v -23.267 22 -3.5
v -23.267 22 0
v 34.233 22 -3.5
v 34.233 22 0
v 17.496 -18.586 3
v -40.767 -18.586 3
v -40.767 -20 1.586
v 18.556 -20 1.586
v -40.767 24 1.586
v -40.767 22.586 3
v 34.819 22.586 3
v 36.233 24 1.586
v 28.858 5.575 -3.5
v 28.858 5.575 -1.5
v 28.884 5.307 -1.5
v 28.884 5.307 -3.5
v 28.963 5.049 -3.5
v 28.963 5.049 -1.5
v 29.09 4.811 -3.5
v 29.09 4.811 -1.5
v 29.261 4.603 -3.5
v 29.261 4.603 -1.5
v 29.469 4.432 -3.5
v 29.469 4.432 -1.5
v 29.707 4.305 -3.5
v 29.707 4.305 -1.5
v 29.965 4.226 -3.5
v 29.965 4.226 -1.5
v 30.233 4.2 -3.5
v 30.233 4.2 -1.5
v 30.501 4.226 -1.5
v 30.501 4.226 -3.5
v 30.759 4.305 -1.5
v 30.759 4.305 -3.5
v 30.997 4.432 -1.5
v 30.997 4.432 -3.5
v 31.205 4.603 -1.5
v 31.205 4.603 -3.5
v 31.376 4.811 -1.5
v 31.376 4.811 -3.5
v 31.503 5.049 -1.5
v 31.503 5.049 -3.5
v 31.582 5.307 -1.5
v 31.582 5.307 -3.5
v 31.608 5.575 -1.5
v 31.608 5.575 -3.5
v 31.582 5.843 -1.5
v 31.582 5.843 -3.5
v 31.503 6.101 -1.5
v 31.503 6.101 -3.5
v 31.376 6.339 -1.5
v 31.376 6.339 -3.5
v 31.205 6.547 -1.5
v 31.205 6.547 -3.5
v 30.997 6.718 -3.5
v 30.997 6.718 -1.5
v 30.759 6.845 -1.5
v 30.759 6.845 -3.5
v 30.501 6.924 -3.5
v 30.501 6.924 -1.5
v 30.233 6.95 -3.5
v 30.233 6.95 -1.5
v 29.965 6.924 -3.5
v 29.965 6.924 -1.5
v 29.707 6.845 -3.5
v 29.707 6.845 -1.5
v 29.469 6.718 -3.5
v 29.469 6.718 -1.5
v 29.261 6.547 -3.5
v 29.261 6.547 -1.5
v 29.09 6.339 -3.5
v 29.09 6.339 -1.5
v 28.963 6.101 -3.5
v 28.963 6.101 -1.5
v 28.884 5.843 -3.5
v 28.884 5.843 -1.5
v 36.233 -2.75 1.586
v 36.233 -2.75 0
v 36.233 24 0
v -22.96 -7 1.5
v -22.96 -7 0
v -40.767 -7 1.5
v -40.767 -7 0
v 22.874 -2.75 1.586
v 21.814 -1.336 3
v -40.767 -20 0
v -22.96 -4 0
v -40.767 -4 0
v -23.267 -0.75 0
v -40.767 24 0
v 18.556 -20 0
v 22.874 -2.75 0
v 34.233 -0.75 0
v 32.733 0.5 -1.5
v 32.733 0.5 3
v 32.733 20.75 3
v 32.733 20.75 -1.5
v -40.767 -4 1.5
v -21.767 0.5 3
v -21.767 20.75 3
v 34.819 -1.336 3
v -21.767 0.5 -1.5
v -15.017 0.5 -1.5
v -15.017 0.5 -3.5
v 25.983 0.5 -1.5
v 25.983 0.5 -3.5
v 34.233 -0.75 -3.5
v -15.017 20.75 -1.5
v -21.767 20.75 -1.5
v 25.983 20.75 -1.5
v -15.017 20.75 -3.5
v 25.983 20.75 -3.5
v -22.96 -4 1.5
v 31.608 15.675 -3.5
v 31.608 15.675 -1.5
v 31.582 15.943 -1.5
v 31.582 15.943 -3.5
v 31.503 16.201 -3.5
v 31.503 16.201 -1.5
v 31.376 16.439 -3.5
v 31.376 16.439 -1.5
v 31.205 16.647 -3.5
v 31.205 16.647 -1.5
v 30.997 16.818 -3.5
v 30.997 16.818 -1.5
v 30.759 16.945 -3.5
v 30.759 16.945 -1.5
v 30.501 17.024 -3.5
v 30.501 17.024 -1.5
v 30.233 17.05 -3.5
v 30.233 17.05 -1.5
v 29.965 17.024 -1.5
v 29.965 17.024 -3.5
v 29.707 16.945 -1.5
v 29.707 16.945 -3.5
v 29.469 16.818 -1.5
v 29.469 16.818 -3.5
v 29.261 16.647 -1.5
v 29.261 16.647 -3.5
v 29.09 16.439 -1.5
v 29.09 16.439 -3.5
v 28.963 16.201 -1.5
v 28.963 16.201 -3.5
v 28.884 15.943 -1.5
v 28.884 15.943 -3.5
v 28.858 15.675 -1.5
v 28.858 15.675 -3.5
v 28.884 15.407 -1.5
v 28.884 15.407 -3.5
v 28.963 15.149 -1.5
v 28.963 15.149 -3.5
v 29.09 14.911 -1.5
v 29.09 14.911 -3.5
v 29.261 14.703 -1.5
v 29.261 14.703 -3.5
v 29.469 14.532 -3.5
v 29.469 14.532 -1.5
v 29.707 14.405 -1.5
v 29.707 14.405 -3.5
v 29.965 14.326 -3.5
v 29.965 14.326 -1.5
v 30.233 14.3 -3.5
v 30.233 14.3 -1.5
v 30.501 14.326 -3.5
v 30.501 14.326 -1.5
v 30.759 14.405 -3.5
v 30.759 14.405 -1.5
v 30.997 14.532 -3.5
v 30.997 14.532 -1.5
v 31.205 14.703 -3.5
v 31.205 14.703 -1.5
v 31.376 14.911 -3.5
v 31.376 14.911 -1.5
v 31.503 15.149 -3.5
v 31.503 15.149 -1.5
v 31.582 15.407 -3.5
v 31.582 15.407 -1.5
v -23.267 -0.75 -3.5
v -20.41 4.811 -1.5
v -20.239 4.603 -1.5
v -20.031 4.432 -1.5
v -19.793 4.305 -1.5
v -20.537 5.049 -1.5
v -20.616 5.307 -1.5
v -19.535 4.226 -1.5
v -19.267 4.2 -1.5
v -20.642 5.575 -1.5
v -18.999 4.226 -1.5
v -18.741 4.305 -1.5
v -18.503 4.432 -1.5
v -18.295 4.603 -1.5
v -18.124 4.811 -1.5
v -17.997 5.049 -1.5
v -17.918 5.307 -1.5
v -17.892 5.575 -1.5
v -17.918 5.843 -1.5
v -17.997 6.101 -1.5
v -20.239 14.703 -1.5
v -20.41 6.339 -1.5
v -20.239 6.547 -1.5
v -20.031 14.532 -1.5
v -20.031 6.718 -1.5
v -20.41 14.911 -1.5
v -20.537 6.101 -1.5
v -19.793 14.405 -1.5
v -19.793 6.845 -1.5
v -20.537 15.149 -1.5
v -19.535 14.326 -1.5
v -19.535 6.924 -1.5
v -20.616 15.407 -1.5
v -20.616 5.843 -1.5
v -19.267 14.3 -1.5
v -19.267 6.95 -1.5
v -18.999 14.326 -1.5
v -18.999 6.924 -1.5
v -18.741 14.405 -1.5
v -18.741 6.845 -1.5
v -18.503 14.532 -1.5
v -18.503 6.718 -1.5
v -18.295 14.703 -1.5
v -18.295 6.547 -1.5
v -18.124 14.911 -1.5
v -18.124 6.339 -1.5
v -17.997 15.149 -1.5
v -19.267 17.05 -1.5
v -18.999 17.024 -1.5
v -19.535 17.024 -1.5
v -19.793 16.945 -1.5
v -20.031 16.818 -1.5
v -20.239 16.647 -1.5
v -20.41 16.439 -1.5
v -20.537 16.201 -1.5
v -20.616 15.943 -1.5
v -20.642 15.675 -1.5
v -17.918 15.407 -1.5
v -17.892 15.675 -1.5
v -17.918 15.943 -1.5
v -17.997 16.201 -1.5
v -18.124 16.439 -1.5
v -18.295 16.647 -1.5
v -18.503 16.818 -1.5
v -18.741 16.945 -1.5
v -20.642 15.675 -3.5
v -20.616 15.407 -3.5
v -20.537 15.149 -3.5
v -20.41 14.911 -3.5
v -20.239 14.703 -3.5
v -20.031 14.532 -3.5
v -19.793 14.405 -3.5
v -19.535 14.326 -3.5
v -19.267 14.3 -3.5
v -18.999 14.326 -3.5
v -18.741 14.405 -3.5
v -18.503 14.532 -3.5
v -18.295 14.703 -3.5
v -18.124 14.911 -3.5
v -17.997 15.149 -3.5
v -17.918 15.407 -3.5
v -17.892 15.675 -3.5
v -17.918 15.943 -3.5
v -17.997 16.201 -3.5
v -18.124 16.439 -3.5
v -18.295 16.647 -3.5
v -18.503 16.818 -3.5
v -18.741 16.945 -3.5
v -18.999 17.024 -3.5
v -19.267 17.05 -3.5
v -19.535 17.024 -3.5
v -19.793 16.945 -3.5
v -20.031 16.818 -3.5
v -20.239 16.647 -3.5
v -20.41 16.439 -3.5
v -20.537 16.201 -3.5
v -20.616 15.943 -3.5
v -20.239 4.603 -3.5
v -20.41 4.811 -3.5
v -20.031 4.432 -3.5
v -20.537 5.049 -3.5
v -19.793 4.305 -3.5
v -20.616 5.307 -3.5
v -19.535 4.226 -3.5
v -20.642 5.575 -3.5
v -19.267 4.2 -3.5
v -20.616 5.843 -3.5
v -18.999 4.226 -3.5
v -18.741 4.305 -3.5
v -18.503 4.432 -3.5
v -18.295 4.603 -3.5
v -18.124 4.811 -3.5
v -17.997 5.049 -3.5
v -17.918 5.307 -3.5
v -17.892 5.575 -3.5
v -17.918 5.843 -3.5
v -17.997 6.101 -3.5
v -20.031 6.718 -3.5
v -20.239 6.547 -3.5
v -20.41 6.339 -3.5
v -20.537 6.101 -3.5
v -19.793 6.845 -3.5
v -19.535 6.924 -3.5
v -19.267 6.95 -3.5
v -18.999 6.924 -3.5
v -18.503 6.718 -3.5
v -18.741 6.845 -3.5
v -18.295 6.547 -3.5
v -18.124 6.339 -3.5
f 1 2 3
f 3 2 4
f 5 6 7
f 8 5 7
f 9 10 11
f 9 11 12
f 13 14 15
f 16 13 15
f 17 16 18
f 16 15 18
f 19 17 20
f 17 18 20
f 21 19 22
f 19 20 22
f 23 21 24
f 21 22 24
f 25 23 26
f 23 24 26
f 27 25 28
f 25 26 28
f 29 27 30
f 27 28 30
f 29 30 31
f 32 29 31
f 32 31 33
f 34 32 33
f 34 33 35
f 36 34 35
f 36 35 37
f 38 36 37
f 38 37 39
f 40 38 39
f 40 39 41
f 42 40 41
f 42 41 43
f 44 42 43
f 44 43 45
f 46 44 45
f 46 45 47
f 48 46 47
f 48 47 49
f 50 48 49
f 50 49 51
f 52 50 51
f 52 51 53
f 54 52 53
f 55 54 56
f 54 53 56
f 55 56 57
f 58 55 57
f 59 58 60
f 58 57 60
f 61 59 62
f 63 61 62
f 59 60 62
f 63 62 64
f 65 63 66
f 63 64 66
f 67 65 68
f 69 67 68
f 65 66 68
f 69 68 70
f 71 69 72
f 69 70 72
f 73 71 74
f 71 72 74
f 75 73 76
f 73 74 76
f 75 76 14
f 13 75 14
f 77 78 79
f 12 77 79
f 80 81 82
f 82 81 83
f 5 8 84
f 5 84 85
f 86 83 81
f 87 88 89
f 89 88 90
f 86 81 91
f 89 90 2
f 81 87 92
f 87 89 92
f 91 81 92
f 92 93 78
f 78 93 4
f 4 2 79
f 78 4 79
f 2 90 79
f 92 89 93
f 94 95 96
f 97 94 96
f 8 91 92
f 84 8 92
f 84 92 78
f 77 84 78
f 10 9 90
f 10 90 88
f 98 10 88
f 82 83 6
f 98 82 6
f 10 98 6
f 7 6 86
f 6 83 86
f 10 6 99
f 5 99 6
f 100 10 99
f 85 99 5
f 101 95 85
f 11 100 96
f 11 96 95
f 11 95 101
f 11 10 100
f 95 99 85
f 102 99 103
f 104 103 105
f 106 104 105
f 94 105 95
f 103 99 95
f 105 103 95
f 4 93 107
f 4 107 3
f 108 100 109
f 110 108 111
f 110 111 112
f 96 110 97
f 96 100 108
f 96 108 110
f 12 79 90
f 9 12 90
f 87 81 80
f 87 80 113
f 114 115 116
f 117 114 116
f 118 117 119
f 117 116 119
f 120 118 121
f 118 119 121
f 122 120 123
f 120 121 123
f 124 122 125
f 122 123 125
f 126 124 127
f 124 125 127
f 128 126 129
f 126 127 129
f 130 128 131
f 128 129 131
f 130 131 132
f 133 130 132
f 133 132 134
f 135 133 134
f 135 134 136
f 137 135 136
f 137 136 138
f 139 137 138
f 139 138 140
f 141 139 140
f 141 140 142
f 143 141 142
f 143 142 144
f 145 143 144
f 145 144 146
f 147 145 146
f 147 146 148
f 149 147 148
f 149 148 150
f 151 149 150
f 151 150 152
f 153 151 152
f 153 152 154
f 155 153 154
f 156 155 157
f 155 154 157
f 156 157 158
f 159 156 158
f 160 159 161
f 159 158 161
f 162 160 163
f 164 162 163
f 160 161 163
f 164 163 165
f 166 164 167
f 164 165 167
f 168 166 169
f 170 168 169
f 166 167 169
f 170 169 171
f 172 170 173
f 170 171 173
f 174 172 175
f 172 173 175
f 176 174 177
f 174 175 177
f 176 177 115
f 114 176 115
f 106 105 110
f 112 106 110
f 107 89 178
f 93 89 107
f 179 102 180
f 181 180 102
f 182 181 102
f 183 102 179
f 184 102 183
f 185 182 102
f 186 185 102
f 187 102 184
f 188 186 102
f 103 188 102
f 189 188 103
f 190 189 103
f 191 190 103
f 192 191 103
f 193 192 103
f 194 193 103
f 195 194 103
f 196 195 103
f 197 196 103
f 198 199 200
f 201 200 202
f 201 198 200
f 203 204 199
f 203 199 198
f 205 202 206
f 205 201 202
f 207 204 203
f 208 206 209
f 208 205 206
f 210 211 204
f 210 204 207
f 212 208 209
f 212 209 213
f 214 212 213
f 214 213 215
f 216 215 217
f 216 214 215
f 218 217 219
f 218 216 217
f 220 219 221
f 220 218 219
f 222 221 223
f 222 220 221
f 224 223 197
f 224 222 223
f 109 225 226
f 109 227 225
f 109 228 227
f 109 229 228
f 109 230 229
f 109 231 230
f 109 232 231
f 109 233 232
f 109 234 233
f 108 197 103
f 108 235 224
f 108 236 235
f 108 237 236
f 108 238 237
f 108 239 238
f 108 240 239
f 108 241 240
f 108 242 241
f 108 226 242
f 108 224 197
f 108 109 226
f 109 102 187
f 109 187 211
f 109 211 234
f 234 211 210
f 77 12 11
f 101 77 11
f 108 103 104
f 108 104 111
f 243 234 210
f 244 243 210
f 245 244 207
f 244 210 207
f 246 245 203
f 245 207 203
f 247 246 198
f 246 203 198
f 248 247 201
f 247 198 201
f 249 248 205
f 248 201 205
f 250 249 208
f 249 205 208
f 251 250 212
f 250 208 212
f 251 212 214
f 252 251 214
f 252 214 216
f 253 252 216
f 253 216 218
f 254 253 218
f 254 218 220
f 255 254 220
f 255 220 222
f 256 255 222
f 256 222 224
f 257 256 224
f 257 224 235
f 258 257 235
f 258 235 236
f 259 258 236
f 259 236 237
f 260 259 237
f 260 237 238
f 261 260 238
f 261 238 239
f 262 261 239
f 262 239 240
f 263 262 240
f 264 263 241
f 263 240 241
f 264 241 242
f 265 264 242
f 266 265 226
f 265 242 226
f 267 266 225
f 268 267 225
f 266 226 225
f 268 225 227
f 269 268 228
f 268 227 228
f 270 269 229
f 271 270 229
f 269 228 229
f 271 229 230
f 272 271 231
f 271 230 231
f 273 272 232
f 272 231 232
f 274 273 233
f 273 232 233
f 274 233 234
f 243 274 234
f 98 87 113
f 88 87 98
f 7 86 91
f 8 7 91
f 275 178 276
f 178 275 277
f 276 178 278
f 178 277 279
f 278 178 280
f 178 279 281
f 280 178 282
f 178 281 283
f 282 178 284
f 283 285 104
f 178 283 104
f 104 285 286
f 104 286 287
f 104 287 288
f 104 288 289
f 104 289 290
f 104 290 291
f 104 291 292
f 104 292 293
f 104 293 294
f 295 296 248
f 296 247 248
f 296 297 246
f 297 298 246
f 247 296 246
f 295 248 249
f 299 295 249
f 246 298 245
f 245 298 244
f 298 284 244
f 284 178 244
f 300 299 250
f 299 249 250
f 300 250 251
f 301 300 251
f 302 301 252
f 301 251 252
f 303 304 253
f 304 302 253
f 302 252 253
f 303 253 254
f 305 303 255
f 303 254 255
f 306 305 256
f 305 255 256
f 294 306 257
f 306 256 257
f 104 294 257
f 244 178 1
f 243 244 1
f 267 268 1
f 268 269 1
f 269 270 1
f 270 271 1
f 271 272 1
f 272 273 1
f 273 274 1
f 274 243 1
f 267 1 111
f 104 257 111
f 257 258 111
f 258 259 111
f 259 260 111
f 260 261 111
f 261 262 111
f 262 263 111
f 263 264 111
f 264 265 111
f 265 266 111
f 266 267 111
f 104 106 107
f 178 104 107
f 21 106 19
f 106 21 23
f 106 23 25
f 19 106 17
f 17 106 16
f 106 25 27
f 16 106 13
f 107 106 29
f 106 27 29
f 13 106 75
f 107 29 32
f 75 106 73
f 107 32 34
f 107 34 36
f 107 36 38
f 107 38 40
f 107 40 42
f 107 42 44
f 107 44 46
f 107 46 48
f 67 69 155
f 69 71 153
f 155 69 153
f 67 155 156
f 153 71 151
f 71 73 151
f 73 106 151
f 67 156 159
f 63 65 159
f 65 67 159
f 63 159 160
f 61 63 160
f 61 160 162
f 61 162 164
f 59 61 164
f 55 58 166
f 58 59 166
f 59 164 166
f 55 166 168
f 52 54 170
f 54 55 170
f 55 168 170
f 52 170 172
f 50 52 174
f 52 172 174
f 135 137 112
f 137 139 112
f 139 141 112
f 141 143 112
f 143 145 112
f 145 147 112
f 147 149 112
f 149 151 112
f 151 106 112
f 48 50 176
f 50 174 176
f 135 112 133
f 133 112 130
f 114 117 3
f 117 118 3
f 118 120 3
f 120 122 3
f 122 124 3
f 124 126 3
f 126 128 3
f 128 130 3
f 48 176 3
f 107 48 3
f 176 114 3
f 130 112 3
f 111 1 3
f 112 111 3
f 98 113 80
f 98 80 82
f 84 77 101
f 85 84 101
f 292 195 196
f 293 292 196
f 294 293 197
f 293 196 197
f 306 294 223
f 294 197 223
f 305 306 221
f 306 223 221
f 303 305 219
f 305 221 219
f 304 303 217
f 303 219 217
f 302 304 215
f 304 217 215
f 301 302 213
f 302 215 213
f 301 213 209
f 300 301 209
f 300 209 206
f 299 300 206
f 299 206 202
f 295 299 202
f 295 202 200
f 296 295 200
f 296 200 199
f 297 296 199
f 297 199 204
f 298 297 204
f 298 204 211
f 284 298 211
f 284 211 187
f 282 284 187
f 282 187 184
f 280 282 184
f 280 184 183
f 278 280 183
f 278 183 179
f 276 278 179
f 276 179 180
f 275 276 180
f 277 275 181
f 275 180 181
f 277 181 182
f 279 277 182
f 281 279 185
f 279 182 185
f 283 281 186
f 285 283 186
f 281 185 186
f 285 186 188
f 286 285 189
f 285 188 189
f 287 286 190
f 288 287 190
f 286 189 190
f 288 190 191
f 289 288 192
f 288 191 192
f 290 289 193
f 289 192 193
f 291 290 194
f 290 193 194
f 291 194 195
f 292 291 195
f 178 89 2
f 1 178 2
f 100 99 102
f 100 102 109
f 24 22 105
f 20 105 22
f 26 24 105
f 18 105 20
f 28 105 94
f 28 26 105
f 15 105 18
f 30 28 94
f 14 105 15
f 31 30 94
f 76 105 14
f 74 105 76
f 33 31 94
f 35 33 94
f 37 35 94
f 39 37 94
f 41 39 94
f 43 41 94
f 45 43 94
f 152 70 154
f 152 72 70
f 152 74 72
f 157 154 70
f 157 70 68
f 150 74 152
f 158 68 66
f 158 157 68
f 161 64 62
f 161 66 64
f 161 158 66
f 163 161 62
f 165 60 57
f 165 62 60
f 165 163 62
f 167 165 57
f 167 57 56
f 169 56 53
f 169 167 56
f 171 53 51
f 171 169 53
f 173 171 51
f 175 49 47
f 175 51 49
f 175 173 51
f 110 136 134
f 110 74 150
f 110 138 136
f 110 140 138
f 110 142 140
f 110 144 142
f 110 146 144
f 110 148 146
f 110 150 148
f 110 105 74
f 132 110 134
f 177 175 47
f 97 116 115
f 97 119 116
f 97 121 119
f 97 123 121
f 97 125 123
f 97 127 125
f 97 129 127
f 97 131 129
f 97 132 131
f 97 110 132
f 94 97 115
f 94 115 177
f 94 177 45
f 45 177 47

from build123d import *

# Parameters (mm, degrees)
BOSS_EXTRUDE1_DEPTH = 3
CUT_EXTRUDE1_REACH  = 82.709
CUT_EXTRUDE2_REACH  = 82.709
CUT_EXTRUDE3_DEPTH  = 49.851933985
CUT_EXTRUDE4_REACH  = 63.973
SKETCH9_W           = 57.5
SKETCH9_H           = 22.75
BOSS_EXTRUDE2_DEPTH = 3.5
SKETCH13_W          = 54.5
SKETCH13_H          = 20.25
CUT_EXTRUDE6_DEPTH  = 4.5
SKETCH14_W          = 41
SKETCH14_H          = 20.25
CUT_EXTRUDE7_DEPTH  = 2
CUT_EXTRUDE8_REACH  = 49.521
SKETCH15_R          = 1.375
SKETCH16_W          = 17.807241949
SKETCH16_H          = 3
CUT_EXTRUDE9_DEPTH  = 1.5


with BuildPart() as part:
    # Sketch4 → Boss-Extrude1 (new body)
    with BuildSketch(Plane.XY):
        Polygon((22.874373936, -2.75), (36.232991843, -2.75), (36.232991843, 24), (-40.767008157, 24), (-40.767008157, -20), (18.555957827, -20), align=None)
    extrude(amount=BOSS_EXTRUDE1_DEPTH)

    # Sketch5 → Cut-Extrude1 (cut, up to next)
    with BuildSketch(Plane(origin=(36.232991843, 0, 0), x_dir=(0, 0, -1), z_dir=(1, 0, 0)), mode=Mode.PRIVATE) as cut_extrude1_sk1:
        Polygon((-3, 22.585786438), (-1.585786438, 24), (-3, 24), align=None)
    cut_extrude1_tool1 = extrude(cut_extrude1_sk1.sketch, amount=-CUT_EXTRUDE1_REACH, mode=Mode.PRIVATE) & part.part
    # Sketch5 → Cut-Extrude1 (cut, up to next)
    with BuildSketch(Plane(origin=(36.232991843, 0, 0), x_dir=(0, 0, -1), z_dir=(1, 0, 0)), mode=Mode.PRIVATE) as cut_extrude1_sk2:
        Polygon((-3, -18.585786438), (-1.585786438, -20), (-3, -20), align=None)
    cut_extrude1_tool2 = extrude(cut_extrude1_sk2.sketch, amount=-CUT_EXTRUDE1_REACH, mode=Mode.PRIVATE) & part.part
    add(cut_extrude1_tool1.solids().sort_by_distance((36.232992, 23.528595, 2.528595))[0], mode=Mode.SUBTRACT)
    add(cut_extrude1_tool2.solids().sort_by_distance((36.232992, -19.528595, 2.528595))[0], mode=Mode.SUBTRACT)

    # Cut-Extrude2: up to this plane
    cut_extrude2_end = Plane(origin=(18.555957827, -20, 3), z_dir=(-0.9700641682071632, 0.24284873802543147, 0))
    # Sketch5<4> → Cut-Extrude2 (cut, up to the surface)
    with BuildSketch(Plane(origin=(36.232991843, 0, 0), x_dir=(0, 0, -1), z_dir=(1, 0, 0)), mode=Mode.PRIVATE) as cut_extrude2_sk1:
        Polygon((-1.585786438, -2.75), (-3, -1.335786438), (-3, -2.75), align=None)
    cut_extrude2_tool1 = split(extrude(cut_extrude2_sk1.sketch, amount=-CUT_EXTRUDE2_REACH, mode=Mode.PRIVATE), bisect_by=cut_extrude2_end, keep=Keep.BOTH, mode=Mode.PRIVATE)
    add(cut_extrude2_tool1.solids().sort_by_distance((36.232992, -2.278595, 2.528595))[0], mode=Mode.SUBTRACT)

    # Sketch7 → Cut-Extrude3 (cut, through all)
    with BuildSketch(Plane.XZ.offset(2.75)):
        Polygon((36.232991843, 1.585786438), (34.818778281, 3), (36.232991843, 3), align=None)
    extrude(amount=-CUT_EXTRUDE3_DEPTH, mode=Mode.SUBTRACT)

    # Cut-Extrude4: up to this plane
    cut_extrude4_end = Plane(origin=(21.020533502, -2.167893219, 2.167893219), z_dir=(0, 0.7071067811865472, -0.707106781186548))
    # Sketch8 → Cut-Extrude4 (cut, up to the surface)
    with BuildSketch(Plane.XZ.offset(20), mode=Mode.PRIVATE) as cut_extrude4_sk1:
        Polygon((17.141744264, 3), (18.555957827, 3), (18.555957827, 1.585786438), align=None)
    cut_extrude4_tool1 = split(extrude(cut_extrude4_sk1.sketch, amount=CUT_EXTRUDE4_REACH, dir=(0.242848738025, 0.970064168207, 0), mode=Mode.PRIVATE), bisect_by=cut_extrude4_end, keep=Keep.BOTH, mode=Mode.PRIVATE)
    add(cut_extrude4_tool1.solids().sort_by_distance((18.084553, -20, 2.528595))[0], mode=Mode.SUBTRACT)

    # Sketch9 → Boss-Extrude2 (add)
    with BuildSketch(Plane.XY):
        with Locations((5.482991843, 10.625)):
            Rectangle(SKETCH9_W, SKETCH9_H)
    extrude(amount=-BOSS_EXTRUDE2_DEPTH)

    # Sketch13 → Cut-Extrude6 (cut)
    with BuildSketch(Plane.XY.offset(3)):
        with Locations((5.482991843, 10.625)):
            Rectangle(SKETCH13_W, SKETCH13_H)
    extrude(amount=-CUT_EXTRUDE6_DEPTH, mode=Mode.SUBTRACT)

    # Sketch14 → Cut-Extrude7 (cut)
    with BuildSketch(Plane.XY.offset(-1.5)):
        with Locations((5.482991843, 10.625)):
            Rectangle(SKETCH14_W, SKETCH14_H)
    extrude(amount=-CUT_EXTRUDE7_DEPTH, mode=Mode.SUBTRACT)

    # Sketch15 → Cut-Extrude8 (cut, up to next)
    with BuildSketch(Plane.XY.offset(-1.5), mode=Mode.PRIVATE) as cut_extrude8_sk1:
        with Locations((30.232991843, 15.675)):
            Circle(SKETCH15_R)
    cut_extrude8_tool1 = extrude(cut_extrude8_sk1.sketch, amount=-CUT_EXTRUDE8_REACH, mode=Mode.PRIVATE) & part.part
    # Sketch15 → Cut-Extrude8 (cut, up to next)
    with BuildSketch(Plane.XY.offset(-1.5), mode=Mode.PRIVATE) as cut_extrude8_sk2:
        with Locations(Location((30.232991843, 5.575, 0), (0, 0, 180))):
            Circle(SKETCH15_R)
    cut_extrude8_tool2 = extrude(cut_extrude8_sk2.sketch, amount=-CUT_EXTRUDE8_REACH, mode=Mode.PRIVATE) & part.part
    # Sketch15 → Cut-Extrude8 (cut, up to next)
    with BuildSketch(Plane.XY.offset(-1.5), mode=Mode.PRIVATE) as cut_extrude8_sk3:
        with Locations((-19.267008157, 5.575)):
            Circle(SKETCH15_R)
    cut_extrude8_tool3 = extrude(cut_extrude8_sk3.sketch, amount=-CUT_EXTRUDE8_REACH, mode=Mode.PRIVATE) & part.part
    # Sketch15 → Cut-Extrude8 (cut, up to next)
    with BuildSketch(Plane.XY.offset(-1.5), mode=Mode.PRIVATE) as cut_extrude8_sk4:
        with Locations(Location((-19.267008157, 15.675, 0), (0, 0, 180))):
            Circle(SKETCH15_R)
    cut_extrude8_tool4 = extrude(cut_extrude8_sk4.sketch, amount=-CUT_EXTRUDE8_REACH, mode=Mode.PRIVATE) & part.part
    add(cut_extrude8_tool1.solids().sort_by_distance((30.232992, 15.675, -1.5))[0], mode=Mode.SUBTRACT)
    add(cut_extrude8_tool2.solids().sort_by_distance((30.232992, 5.575, -1.5))[0], mode=Mode.SUBTRACT)
    add(cut_extrude8_tool3.solids().sort_by_distance((-19.267008, 5.575, -1.5))[0], mode=Mode.SUBTRACT)
    add(cut_extrude8_tool4.solids().sort_by_distance((-19.267008, 15.675, -1.5))[0], mode=Mode.SUBTRACT)

    # Sketch16 → Cut-Extrude9 (cut)
    with BuildSketch(Plane(origin=(0, 0, 0), x_dir=(-1, 0, 0), z_dir=(0, 0, -1))):
        with Locations((31.863387182, -5.5)):
            Rectangle(SKETCH16_W, SKETCH16_H)
    extrude(amount=-CUT_EXTRUDE9_DEPTH, mode=Mode.SUBTRACT)


solid = part.part
